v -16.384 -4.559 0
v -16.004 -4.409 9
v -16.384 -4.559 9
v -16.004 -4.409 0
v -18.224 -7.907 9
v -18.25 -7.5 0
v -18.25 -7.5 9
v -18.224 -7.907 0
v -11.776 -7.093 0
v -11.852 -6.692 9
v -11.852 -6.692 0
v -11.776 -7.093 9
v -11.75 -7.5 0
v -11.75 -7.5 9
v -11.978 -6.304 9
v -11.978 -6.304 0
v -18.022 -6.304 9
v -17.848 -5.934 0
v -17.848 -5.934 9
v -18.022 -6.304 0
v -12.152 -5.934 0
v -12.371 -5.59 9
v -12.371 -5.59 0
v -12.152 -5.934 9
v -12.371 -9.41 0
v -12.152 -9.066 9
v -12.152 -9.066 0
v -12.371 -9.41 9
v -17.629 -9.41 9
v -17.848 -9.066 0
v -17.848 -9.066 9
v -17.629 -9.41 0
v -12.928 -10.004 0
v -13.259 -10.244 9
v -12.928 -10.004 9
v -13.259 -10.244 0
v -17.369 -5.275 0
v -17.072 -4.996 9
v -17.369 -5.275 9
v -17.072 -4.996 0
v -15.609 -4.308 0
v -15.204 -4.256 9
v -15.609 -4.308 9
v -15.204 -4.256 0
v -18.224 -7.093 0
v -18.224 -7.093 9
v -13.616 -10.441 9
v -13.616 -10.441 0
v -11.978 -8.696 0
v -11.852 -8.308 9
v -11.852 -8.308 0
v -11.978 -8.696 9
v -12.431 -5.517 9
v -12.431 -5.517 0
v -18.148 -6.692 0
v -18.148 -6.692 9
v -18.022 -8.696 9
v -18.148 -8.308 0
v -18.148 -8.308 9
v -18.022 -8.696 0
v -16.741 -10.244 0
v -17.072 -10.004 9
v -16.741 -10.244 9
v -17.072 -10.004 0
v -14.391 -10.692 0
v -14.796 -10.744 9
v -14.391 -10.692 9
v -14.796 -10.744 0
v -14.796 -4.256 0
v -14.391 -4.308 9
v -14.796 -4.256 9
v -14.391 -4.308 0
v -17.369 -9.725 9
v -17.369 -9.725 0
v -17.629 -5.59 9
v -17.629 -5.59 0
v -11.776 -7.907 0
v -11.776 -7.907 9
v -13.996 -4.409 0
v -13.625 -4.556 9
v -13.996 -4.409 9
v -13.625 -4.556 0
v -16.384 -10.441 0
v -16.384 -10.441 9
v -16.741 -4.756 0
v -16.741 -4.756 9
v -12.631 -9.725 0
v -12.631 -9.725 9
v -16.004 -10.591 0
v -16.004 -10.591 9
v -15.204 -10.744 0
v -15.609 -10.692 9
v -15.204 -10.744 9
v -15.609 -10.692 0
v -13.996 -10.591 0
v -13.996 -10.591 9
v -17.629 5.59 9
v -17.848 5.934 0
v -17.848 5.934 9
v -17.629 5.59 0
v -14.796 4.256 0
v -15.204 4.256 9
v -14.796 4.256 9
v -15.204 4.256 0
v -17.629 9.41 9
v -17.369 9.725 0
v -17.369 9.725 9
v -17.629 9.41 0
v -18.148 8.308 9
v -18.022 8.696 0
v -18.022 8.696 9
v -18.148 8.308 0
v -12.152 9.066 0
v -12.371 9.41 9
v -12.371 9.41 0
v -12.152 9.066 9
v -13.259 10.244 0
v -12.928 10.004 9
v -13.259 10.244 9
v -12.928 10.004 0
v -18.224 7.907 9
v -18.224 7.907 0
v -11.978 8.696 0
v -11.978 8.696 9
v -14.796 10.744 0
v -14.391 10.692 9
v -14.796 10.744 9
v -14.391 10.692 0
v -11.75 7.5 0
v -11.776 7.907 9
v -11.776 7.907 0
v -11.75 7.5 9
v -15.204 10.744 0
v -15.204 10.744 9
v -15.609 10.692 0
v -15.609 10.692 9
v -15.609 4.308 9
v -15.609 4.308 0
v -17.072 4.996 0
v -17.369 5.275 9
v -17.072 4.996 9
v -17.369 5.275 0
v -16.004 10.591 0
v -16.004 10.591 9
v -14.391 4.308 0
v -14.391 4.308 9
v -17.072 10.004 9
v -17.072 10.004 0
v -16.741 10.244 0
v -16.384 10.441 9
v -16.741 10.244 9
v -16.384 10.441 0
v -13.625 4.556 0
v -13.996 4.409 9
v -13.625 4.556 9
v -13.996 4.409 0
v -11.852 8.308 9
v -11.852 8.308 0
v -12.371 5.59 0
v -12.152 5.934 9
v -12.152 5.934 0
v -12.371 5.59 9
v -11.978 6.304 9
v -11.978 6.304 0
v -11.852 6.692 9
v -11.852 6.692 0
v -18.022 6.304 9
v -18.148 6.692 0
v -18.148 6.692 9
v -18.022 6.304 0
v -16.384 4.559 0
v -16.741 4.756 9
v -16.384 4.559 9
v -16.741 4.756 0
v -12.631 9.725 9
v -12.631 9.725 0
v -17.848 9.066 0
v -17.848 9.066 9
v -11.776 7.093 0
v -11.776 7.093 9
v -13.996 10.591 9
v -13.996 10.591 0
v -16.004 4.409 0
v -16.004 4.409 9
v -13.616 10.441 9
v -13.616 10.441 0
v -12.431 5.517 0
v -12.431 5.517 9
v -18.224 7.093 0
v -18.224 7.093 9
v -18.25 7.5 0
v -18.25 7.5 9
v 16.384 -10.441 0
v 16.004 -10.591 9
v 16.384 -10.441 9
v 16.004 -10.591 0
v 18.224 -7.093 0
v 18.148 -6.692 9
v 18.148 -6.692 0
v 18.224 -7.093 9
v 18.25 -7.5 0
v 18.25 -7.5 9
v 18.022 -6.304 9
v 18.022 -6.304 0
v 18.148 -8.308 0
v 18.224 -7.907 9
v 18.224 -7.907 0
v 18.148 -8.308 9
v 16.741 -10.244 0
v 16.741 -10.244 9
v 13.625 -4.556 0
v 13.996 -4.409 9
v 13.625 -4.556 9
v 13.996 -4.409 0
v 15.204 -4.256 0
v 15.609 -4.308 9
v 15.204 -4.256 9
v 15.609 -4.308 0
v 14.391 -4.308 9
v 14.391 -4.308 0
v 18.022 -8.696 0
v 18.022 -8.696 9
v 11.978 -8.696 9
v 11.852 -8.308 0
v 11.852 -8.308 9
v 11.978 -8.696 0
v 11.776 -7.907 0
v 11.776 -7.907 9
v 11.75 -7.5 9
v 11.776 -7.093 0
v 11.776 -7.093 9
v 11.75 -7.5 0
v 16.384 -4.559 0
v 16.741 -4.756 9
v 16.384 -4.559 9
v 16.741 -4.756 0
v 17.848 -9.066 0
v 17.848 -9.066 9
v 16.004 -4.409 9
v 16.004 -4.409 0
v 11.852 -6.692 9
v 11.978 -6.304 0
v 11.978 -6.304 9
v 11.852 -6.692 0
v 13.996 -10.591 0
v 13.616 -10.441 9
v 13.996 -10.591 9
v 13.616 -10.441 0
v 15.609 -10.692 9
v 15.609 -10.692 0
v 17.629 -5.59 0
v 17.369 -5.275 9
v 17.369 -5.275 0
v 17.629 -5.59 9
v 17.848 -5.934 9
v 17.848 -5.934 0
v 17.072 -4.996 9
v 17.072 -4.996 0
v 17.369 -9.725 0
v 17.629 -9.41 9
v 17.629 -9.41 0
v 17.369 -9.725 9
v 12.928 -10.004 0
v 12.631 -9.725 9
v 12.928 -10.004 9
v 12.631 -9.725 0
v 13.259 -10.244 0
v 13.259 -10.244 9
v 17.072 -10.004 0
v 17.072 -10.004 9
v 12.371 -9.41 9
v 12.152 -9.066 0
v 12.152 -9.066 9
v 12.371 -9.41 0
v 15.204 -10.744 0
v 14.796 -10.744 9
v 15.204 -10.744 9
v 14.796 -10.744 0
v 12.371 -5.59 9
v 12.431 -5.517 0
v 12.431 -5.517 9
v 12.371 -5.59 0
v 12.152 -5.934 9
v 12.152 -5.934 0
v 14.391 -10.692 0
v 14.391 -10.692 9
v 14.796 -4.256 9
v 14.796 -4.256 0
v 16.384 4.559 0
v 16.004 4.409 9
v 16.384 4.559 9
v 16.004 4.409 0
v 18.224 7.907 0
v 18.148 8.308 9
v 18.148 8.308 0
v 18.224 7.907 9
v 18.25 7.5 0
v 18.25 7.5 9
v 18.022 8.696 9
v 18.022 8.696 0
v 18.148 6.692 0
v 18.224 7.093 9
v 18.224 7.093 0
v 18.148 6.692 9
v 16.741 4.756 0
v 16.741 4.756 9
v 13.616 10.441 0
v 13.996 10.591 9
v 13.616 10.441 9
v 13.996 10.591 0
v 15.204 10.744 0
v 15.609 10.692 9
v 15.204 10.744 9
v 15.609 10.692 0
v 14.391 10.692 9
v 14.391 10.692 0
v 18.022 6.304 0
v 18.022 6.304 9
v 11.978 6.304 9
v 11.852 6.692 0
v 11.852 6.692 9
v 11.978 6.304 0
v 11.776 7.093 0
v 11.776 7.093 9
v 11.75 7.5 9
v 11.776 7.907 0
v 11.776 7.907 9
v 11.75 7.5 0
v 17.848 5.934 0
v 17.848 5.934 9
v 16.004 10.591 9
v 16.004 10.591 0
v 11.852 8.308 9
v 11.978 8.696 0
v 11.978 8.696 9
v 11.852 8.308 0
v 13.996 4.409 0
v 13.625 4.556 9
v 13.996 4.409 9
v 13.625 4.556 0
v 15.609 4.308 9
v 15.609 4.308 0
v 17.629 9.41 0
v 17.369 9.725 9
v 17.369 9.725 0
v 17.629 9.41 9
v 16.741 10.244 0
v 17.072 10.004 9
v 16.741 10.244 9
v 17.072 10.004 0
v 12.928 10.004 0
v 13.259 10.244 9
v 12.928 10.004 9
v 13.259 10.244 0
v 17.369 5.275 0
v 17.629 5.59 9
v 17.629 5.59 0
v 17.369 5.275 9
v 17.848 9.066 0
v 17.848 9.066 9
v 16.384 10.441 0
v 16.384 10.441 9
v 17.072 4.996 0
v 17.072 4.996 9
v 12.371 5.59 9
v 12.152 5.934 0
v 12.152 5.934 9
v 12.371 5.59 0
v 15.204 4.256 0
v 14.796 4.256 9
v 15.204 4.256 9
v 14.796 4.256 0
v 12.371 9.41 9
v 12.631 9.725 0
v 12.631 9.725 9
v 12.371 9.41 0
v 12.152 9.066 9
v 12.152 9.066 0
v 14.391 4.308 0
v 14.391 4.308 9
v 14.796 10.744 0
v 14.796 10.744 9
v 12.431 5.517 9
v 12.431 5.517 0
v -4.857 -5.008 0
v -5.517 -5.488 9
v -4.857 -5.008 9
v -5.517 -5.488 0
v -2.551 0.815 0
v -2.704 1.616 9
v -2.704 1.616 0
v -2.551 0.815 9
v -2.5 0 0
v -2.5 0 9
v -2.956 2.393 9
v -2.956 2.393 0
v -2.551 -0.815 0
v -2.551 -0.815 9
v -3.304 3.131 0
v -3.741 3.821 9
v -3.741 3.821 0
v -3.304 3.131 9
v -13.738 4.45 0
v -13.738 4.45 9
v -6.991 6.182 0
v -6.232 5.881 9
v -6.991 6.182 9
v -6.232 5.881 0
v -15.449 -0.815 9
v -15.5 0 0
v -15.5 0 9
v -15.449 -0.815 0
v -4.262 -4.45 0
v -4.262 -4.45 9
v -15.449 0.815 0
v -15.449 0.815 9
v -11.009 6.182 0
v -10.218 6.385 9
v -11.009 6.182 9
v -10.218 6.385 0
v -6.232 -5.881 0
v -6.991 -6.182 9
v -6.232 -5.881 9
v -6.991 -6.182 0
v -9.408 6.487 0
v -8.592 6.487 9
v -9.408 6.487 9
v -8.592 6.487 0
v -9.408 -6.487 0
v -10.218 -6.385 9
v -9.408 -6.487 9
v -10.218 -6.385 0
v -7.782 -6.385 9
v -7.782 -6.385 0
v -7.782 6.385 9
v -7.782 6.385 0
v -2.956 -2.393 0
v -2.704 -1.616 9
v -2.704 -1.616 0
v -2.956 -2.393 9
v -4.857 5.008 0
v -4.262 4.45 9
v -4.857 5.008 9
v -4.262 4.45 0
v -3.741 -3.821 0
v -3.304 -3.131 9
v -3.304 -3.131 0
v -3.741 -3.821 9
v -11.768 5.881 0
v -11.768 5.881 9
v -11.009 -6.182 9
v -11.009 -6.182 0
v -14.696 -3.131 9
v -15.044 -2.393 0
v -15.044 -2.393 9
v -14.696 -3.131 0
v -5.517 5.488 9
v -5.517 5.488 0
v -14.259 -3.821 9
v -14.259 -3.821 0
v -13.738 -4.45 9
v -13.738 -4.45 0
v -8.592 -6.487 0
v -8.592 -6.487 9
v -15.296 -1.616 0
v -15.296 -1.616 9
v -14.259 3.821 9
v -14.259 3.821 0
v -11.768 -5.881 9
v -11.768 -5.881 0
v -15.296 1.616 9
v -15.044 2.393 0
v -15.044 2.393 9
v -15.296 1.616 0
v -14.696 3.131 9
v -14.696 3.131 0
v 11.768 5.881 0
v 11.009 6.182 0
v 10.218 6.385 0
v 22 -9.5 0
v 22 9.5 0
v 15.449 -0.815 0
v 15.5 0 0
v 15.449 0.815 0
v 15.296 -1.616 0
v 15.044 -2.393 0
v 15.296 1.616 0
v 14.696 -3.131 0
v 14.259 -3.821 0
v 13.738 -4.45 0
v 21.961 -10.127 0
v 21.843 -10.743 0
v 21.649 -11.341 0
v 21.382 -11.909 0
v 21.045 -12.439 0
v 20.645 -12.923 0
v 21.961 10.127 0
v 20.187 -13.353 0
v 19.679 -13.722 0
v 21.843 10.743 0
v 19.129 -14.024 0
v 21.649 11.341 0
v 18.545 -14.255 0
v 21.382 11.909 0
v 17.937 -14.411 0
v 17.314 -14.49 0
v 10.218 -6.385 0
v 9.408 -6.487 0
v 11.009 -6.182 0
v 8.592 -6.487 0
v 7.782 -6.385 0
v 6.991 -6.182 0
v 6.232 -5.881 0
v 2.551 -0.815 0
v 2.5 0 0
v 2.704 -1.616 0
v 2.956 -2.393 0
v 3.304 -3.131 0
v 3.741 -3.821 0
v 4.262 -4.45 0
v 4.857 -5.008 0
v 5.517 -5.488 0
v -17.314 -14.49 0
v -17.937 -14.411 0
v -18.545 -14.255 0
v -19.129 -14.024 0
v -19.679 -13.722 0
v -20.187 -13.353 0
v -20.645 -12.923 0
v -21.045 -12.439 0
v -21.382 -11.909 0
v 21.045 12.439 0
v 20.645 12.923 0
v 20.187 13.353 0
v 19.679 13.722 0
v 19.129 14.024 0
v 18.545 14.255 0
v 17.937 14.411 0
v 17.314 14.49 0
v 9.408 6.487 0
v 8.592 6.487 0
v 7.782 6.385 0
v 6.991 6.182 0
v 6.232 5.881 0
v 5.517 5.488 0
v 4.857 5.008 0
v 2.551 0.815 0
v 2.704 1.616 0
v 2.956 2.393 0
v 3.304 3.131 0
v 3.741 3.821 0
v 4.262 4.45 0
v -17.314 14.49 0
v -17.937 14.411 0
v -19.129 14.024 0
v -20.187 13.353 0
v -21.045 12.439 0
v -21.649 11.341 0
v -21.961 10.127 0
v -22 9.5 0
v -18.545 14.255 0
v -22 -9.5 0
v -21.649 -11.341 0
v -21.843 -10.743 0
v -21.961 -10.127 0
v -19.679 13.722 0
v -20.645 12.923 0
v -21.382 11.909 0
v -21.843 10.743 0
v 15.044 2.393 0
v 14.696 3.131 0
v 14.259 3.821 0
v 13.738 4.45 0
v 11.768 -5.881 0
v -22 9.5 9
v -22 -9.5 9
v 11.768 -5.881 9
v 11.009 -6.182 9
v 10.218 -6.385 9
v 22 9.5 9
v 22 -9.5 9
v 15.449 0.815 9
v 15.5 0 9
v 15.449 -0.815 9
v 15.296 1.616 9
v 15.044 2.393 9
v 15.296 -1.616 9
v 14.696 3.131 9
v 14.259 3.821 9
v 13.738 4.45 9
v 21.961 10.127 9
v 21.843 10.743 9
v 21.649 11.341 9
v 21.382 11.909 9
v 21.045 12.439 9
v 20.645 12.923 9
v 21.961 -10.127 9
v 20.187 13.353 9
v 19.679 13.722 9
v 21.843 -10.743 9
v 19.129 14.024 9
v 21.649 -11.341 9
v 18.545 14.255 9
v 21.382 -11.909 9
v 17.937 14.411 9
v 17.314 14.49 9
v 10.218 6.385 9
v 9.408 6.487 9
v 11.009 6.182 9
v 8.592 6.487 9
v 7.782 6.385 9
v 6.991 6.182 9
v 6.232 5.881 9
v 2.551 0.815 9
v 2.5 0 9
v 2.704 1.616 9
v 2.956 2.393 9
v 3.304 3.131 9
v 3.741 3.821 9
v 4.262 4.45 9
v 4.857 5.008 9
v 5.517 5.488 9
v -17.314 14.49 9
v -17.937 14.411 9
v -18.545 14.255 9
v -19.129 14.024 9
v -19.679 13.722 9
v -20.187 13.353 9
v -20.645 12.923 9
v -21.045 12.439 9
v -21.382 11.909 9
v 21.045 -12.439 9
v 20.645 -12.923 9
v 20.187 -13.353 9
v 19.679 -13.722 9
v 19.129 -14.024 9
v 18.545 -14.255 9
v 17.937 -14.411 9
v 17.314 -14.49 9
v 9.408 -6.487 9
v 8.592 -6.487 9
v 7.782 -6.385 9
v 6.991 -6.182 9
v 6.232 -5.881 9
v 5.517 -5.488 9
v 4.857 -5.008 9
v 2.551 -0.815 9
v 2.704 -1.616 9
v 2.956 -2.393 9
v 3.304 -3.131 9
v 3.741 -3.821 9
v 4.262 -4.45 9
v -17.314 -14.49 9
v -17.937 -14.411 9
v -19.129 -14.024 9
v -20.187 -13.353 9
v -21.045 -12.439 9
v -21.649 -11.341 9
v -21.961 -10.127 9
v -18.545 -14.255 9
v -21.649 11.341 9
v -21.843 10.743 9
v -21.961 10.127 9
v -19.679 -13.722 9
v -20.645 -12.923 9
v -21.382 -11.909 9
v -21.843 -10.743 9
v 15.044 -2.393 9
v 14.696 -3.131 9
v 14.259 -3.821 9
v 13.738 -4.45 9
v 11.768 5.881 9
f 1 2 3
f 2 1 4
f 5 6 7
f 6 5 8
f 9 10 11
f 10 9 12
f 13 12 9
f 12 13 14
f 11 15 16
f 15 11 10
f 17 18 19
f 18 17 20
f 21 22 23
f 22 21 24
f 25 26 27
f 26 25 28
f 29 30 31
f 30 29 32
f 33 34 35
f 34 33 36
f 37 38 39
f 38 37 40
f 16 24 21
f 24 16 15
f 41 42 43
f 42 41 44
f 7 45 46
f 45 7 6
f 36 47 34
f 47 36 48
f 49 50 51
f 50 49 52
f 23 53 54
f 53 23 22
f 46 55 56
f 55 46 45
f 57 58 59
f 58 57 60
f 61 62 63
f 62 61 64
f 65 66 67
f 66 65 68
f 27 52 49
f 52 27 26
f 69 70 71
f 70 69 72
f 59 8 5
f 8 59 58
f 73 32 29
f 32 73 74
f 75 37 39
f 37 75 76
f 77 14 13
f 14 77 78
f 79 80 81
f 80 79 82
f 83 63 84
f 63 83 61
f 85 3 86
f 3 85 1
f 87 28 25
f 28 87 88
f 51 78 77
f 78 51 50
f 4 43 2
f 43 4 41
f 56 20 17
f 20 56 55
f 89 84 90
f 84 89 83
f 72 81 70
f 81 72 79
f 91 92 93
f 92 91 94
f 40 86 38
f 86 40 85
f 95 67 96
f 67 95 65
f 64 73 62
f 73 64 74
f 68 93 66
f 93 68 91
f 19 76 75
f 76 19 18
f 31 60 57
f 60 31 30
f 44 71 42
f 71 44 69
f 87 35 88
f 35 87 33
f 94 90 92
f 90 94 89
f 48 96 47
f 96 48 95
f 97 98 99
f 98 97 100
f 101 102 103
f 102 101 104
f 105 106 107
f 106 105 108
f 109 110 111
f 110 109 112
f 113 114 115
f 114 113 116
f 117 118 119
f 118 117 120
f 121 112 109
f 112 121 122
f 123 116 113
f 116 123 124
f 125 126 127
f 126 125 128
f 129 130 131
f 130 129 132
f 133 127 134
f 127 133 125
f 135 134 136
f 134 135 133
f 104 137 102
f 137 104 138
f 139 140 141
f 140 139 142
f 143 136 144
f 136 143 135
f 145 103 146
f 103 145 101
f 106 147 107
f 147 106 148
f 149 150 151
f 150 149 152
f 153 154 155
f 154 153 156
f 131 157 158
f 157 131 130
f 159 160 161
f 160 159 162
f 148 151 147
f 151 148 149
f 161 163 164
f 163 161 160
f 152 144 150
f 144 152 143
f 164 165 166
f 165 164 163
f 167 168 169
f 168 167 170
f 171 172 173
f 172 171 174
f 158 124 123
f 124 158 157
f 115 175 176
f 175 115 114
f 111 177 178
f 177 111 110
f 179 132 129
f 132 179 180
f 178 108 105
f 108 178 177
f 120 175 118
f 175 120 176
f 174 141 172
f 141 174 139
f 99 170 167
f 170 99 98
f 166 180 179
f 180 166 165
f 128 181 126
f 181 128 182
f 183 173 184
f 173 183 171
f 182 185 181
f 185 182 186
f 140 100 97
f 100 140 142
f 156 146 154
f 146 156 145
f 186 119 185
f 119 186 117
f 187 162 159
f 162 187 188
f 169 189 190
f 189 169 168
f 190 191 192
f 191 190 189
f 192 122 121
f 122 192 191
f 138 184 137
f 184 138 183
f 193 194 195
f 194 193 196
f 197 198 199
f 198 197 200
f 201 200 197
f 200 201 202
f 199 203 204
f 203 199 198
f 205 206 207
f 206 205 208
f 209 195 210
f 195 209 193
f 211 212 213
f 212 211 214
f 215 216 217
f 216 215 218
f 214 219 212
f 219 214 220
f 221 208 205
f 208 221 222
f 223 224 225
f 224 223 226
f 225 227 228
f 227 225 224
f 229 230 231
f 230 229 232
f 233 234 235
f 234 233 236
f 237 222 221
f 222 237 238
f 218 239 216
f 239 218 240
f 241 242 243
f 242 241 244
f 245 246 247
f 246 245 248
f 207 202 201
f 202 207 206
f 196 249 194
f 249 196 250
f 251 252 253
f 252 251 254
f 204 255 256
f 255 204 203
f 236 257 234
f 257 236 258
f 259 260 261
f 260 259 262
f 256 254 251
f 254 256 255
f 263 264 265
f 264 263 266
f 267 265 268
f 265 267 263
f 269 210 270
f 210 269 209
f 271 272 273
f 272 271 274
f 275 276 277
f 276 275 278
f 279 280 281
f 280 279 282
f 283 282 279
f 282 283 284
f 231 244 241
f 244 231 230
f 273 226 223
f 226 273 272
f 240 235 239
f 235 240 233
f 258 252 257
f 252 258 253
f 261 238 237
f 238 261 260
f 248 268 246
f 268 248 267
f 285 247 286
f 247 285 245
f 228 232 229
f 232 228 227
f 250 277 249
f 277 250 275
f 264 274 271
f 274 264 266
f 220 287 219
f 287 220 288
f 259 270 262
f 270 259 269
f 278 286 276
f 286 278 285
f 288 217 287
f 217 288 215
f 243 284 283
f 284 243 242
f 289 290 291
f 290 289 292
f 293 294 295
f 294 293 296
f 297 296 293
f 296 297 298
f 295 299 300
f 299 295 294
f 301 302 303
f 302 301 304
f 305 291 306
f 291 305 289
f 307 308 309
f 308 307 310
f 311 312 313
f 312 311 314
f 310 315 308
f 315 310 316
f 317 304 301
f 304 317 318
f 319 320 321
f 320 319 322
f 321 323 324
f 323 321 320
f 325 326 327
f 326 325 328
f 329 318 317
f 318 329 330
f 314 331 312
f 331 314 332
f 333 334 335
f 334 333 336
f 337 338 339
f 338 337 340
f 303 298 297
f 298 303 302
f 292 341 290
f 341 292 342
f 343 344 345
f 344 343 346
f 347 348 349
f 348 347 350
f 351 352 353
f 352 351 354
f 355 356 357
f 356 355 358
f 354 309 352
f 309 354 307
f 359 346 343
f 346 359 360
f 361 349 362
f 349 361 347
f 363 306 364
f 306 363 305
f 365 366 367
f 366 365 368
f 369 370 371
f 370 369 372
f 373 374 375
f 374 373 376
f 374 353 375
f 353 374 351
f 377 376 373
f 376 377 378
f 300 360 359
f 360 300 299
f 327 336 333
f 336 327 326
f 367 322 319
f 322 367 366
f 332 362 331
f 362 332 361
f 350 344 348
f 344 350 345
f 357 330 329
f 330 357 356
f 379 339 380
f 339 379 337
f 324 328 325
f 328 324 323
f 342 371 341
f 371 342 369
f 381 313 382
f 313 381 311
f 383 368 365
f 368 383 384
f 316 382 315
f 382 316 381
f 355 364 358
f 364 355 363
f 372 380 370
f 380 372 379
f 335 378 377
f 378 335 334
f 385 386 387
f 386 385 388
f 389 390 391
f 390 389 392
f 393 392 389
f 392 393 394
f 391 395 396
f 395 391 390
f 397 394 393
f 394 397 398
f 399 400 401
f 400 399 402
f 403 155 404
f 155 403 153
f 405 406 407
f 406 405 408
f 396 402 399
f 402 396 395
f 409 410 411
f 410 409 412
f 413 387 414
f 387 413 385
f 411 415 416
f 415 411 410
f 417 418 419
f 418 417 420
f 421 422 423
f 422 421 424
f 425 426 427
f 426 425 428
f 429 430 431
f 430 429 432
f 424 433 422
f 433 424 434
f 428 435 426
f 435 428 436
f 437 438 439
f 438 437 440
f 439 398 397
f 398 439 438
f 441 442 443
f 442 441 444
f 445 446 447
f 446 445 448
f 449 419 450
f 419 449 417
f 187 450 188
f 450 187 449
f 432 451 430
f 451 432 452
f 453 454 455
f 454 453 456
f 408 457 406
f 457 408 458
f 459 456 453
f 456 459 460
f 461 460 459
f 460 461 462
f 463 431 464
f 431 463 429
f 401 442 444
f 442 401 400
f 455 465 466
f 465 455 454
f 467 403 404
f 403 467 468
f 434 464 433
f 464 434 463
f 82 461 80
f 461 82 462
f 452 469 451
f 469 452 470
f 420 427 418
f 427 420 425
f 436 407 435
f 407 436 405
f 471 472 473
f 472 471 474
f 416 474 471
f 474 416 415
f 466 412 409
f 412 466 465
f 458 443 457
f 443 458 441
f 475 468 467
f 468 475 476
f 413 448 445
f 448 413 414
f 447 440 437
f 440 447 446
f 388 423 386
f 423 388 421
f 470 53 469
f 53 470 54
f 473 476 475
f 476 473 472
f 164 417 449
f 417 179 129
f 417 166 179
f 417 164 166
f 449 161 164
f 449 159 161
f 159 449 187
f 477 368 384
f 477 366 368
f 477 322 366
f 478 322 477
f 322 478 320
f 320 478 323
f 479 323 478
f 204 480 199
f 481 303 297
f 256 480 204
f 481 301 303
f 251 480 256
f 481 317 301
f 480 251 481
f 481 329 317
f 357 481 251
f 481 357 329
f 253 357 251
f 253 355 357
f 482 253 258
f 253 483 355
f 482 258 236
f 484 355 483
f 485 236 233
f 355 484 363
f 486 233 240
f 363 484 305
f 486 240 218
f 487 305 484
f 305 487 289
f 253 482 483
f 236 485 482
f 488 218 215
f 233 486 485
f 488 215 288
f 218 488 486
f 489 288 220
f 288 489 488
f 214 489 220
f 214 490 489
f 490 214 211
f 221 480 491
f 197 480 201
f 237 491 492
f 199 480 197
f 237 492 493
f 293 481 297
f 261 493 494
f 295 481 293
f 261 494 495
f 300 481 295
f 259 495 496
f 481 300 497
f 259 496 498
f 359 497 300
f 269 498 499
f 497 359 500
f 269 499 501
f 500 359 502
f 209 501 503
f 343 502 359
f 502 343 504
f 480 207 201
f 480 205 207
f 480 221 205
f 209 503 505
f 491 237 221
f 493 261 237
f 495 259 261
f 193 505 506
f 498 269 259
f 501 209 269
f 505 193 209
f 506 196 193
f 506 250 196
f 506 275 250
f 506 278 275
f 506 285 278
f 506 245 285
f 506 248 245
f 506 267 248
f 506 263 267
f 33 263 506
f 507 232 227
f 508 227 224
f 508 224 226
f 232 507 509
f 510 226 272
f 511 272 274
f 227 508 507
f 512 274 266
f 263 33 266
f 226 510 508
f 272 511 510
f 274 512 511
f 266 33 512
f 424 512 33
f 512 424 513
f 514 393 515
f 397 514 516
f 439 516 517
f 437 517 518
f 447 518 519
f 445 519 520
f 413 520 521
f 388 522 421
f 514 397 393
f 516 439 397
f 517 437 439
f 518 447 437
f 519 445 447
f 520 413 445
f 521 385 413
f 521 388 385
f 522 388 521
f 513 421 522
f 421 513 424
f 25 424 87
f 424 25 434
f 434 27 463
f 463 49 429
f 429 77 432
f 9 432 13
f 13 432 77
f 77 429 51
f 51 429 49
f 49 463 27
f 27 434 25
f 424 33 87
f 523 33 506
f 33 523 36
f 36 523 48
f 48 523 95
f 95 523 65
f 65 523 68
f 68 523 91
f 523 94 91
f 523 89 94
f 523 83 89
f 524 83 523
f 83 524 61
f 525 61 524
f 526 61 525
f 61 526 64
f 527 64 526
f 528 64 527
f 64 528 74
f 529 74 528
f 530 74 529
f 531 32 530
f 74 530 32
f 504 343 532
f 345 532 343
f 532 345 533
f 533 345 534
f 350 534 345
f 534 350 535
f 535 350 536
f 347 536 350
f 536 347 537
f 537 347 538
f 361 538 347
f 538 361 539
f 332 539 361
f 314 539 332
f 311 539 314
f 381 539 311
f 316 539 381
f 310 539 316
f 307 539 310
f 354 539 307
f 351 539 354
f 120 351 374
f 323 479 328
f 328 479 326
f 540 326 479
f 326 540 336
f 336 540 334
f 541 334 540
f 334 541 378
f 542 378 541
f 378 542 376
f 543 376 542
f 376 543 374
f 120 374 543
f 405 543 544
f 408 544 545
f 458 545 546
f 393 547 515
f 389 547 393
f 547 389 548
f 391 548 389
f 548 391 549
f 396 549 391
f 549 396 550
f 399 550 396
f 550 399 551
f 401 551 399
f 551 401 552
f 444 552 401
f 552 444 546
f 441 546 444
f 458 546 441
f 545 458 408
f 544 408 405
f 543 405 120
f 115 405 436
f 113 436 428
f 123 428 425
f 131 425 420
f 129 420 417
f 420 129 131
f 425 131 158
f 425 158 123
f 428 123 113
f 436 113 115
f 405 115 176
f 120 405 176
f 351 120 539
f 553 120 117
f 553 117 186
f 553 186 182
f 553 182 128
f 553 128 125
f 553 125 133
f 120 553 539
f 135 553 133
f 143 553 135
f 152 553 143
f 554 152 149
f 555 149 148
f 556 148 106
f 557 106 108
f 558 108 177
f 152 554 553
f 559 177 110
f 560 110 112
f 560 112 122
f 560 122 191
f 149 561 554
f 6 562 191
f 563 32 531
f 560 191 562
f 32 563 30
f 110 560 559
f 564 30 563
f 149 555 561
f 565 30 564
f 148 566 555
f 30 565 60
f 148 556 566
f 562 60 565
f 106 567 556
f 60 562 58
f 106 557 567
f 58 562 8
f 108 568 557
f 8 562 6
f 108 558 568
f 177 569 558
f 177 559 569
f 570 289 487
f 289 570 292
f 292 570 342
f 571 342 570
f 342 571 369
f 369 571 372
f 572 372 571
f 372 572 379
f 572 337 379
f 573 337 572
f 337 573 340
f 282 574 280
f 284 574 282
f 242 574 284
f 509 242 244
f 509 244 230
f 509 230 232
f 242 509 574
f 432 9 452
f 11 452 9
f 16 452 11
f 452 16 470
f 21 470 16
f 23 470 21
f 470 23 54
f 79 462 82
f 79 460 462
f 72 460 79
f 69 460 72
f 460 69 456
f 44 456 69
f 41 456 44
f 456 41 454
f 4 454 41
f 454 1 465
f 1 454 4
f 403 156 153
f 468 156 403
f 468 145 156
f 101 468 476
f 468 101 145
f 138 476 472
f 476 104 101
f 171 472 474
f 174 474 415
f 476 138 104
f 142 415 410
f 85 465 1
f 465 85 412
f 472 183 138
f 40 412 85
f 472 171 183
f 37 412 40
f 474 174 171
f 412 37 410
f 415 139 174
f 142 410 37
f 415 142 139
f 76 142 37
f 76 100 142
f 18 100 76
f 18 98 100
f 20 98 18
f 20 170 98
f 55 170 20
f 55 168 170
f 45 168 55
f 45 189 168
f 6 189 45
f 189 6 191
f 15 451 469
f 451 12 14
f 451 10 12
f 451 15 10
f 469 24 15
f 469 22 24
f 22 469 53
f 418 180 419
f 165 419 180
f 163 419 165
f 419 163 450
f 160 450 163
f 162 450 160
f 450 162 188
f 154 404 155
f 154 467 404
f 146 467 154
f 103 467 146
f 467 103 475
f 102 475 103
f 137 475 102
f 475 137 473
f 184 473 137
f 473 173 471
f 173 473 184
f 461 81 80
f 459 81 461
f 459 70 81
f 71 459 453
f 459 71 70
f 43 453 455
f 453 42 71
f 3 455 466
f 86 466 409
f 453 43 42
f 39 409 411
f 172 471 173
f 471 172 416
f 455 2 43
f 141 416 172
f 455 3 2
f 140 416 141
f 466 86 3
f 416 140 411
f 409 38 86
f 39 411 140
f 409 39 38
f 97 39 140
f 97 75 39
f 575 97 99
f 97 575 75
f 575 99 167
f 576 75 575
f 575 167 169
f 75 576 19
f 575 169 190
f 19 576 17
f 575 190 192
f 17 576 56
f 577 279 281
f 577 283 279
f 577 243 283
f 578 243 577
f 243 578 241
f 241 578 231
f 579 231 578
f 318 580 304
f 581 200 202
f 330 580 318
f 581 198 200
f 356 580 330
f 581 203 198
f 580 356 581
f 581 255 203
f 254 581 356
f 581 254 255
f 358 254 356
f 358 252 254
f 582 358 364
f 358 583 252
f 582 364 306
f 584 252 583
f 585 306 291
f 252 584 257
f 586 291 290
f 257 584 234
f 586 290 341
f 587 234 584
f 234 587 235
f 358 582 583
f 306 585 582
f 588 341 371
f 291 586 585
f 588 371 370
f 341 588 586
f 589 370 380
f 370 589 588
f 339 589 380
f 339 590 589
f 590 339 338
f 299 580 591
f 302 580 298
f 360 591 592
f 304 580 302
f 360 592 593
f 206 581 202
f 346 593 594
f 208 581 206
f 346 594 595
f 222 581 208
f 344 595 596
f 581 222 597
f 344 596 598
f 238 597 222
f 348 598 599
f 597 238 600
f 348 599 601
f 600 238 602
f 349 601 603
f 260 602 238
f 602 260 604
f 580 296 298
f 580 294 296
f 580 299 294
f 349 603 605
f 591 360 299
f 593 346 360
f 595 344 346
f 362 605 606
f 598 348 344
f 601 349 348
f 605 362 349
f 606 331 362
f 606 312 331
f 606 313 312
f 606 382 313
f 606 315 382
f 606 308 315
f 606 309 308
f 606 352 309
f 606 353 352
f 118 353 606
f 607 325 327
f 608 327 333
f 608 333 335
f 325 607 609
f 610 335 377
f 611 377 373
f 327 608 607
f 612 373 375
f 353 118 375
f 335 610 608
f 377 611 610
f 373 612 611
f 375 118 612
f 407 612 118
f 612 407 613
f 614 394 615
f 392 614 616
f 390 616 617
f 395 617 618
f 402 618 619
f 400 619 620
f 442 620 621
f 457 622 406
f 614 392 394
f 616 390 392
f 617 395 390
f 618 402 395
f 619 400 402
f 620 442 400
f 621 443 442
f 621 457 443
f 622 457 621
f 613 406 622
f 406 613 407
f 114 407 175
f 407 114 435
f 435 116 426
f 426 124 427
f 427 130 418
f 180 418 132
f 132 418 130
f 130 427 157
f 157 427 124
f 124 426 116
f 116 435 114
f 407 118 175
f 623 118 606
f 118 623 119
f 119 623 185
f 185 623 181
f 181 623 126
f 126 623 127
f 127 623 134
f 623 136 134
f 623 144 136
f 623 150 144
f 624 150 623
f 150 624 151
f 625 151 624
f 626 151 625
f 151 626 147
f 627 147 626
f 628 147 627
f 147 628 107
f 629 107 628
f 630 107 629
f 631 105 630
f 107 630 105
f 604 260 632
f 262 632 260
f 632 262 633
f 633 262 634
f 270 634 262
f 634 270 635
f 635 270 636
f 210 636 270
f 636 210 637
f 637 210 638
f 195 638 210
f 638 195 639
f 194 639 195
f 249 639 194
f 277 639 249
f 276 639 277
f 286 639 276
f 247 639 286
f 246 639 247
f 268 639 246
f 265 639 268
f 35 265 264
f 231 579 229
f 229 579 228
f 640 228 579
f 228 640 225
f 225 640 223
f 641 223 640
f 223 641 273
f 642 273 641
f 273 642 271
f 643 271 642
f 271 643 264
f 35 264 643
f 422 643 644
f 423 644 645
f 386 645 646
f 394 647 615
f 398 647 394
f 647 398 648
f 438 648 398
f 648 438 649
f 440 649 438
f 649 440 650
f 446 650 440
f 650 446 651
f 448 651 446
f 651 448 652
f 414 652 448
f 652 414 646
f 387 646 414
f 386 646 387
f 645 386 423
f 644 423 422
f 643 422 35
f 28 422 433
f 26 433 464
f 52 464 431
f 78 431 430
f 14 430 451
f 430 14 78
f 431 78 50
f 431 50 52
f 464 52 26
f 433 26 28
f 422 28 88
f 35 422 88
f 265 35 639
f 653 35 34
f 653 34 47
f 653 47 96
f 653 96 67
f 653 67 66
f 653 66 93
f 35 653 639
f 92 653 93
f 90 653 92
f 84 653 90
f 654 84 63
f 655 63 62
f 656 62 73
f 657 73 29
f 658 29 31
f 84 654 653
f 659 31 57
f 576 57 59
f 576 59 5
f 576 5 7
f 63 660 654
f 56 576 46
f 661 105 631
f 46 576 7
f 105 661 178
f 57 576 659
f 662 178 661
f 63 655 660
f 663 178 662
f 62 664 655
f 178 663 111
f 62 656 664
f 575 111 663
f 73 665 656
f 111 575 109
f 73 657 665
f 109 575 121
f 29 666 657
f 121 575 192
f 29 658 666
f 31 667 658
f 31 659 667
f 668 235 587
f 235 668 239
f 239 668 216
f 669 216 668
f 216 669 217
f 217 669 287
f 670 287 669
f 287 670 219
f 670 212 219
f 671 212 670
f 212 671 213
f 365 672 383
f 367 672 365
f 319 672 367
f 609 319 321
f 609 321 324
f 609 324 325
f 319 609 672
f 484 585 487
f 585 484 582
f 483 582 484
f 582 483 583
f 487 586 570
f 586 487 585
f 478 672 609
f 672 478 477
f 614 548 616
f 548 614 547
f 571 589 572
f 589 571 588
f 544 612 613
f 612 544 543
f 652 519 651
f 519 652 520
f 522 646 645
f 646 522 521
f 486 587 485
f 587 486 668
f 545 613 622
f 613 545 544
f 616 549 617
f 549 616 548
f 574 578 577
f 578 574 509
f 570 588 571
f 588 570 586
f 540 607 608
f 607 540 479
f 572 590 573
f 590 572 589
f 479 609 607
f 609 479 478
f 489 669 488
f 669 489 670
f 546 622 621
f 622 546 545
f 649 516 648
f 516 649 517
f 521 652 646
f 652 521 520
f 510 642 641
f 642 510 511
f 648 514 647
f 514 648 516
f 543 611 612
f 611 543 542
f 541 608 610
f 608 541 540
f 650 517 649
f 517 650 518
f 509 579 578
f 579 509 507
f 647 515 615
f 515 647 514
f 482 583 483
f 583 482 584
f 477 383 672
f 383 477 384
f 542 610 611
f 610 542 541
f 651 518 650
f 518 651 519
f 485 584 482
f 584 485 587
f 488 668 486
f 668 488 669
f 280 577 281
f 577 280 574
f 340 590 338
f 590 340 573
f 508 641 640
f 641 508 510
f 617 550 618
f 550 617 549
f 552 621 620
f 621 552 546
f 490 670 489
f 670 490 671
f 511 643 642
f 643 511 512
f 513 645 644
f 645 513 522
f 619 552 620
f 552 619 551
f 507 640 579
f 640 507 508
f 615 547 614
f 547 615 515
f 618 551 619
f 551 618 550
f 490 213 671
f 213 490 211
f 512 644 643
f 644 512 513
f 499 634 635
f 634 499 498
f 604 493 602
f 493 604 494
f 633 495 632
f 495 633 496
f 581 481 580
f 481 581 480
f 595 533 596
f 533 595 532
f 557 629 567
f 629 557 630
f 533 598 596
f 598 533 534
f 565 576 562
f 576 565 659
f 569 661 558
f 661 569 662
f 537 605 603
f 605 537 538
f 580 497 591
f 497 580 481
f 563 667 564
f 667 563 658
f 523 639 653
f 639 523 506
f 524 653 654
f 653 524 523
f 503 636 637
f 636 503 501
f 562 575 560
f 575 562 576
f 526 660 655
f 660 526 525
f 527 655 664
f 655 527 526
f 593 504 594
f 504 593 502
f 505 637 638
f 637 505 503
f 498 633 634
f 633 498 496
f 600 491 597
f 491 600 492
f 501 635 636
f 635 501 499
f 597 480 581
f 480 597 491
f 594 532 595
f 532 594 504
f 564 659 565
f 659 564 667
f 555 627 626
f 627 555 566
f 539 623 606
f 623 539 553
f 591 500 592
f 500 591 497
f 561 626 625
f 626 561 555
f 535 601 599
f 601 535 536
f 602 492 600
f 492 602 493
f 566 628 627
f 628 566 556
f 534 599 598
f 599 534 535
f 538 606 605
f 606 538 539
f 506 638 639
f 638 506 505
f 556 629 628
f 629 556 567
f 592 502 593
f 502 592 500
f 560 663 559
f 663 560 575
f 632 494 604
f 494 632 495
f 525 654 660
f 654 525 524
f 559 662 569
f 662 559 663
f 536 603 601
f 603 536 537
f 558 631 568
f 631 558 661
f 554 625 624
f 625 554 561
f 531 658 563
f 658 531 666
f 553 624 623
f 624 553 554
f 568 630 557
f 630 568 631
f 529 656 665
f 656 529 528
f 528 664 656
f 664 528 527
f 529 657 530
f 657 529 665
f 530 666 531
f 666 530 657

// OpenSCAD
$fn = 50;


difference() {
	union() {
		hull() {
			translate(v = [-17.0000000000, 9.5000000000, 0]) {
				cylinder(h = 9, r = 5);
			}
			translate(v = [17.0000000000, 9.5000000000, 0]) {
				cylinder(h = 9, r = 5);
			}
			translate(v = [-17.0000000000, -9.5000000000, 0]) {
				cylinder(h = 9, r = 5);
			}
			translate(v = [17.0000000000, -9.5000000000, 0]) {
				cylinder(h = 9, r = 5);
			}
		}
	}
	union() {
		#translate(v = [-15.0000000000, -7.5000000000, -100.0000000000]) {
			cylinder(h = 200, r = 3.2500000000);
		}
		#translate(v = [-15.0000000000, 7.5000000000, -100.0000000000]) {
			cylinder(h = 200, r = 3.2500000000);
		}
		#translate(v = [15.0000000000, -7.5000000000, -100.0000000000]) {
			cylinder(h = 200, r = 3.2500000000);
		}
		#translate(v = [15.0000000000, 7.5000000000, -100.0000000000]) {
			cylinder(h = 200, r = 3.2500000000);
		}
		#translate(v = [-9.0000000000, 0, 0]) {
			cylinder(h = 9, r = 6.5000000000);
		}
		#translate(v = [9.0000000000, 0, 0]) {
			cylinder(h = 9, r = 6.5000000000);
		}
	}
}
